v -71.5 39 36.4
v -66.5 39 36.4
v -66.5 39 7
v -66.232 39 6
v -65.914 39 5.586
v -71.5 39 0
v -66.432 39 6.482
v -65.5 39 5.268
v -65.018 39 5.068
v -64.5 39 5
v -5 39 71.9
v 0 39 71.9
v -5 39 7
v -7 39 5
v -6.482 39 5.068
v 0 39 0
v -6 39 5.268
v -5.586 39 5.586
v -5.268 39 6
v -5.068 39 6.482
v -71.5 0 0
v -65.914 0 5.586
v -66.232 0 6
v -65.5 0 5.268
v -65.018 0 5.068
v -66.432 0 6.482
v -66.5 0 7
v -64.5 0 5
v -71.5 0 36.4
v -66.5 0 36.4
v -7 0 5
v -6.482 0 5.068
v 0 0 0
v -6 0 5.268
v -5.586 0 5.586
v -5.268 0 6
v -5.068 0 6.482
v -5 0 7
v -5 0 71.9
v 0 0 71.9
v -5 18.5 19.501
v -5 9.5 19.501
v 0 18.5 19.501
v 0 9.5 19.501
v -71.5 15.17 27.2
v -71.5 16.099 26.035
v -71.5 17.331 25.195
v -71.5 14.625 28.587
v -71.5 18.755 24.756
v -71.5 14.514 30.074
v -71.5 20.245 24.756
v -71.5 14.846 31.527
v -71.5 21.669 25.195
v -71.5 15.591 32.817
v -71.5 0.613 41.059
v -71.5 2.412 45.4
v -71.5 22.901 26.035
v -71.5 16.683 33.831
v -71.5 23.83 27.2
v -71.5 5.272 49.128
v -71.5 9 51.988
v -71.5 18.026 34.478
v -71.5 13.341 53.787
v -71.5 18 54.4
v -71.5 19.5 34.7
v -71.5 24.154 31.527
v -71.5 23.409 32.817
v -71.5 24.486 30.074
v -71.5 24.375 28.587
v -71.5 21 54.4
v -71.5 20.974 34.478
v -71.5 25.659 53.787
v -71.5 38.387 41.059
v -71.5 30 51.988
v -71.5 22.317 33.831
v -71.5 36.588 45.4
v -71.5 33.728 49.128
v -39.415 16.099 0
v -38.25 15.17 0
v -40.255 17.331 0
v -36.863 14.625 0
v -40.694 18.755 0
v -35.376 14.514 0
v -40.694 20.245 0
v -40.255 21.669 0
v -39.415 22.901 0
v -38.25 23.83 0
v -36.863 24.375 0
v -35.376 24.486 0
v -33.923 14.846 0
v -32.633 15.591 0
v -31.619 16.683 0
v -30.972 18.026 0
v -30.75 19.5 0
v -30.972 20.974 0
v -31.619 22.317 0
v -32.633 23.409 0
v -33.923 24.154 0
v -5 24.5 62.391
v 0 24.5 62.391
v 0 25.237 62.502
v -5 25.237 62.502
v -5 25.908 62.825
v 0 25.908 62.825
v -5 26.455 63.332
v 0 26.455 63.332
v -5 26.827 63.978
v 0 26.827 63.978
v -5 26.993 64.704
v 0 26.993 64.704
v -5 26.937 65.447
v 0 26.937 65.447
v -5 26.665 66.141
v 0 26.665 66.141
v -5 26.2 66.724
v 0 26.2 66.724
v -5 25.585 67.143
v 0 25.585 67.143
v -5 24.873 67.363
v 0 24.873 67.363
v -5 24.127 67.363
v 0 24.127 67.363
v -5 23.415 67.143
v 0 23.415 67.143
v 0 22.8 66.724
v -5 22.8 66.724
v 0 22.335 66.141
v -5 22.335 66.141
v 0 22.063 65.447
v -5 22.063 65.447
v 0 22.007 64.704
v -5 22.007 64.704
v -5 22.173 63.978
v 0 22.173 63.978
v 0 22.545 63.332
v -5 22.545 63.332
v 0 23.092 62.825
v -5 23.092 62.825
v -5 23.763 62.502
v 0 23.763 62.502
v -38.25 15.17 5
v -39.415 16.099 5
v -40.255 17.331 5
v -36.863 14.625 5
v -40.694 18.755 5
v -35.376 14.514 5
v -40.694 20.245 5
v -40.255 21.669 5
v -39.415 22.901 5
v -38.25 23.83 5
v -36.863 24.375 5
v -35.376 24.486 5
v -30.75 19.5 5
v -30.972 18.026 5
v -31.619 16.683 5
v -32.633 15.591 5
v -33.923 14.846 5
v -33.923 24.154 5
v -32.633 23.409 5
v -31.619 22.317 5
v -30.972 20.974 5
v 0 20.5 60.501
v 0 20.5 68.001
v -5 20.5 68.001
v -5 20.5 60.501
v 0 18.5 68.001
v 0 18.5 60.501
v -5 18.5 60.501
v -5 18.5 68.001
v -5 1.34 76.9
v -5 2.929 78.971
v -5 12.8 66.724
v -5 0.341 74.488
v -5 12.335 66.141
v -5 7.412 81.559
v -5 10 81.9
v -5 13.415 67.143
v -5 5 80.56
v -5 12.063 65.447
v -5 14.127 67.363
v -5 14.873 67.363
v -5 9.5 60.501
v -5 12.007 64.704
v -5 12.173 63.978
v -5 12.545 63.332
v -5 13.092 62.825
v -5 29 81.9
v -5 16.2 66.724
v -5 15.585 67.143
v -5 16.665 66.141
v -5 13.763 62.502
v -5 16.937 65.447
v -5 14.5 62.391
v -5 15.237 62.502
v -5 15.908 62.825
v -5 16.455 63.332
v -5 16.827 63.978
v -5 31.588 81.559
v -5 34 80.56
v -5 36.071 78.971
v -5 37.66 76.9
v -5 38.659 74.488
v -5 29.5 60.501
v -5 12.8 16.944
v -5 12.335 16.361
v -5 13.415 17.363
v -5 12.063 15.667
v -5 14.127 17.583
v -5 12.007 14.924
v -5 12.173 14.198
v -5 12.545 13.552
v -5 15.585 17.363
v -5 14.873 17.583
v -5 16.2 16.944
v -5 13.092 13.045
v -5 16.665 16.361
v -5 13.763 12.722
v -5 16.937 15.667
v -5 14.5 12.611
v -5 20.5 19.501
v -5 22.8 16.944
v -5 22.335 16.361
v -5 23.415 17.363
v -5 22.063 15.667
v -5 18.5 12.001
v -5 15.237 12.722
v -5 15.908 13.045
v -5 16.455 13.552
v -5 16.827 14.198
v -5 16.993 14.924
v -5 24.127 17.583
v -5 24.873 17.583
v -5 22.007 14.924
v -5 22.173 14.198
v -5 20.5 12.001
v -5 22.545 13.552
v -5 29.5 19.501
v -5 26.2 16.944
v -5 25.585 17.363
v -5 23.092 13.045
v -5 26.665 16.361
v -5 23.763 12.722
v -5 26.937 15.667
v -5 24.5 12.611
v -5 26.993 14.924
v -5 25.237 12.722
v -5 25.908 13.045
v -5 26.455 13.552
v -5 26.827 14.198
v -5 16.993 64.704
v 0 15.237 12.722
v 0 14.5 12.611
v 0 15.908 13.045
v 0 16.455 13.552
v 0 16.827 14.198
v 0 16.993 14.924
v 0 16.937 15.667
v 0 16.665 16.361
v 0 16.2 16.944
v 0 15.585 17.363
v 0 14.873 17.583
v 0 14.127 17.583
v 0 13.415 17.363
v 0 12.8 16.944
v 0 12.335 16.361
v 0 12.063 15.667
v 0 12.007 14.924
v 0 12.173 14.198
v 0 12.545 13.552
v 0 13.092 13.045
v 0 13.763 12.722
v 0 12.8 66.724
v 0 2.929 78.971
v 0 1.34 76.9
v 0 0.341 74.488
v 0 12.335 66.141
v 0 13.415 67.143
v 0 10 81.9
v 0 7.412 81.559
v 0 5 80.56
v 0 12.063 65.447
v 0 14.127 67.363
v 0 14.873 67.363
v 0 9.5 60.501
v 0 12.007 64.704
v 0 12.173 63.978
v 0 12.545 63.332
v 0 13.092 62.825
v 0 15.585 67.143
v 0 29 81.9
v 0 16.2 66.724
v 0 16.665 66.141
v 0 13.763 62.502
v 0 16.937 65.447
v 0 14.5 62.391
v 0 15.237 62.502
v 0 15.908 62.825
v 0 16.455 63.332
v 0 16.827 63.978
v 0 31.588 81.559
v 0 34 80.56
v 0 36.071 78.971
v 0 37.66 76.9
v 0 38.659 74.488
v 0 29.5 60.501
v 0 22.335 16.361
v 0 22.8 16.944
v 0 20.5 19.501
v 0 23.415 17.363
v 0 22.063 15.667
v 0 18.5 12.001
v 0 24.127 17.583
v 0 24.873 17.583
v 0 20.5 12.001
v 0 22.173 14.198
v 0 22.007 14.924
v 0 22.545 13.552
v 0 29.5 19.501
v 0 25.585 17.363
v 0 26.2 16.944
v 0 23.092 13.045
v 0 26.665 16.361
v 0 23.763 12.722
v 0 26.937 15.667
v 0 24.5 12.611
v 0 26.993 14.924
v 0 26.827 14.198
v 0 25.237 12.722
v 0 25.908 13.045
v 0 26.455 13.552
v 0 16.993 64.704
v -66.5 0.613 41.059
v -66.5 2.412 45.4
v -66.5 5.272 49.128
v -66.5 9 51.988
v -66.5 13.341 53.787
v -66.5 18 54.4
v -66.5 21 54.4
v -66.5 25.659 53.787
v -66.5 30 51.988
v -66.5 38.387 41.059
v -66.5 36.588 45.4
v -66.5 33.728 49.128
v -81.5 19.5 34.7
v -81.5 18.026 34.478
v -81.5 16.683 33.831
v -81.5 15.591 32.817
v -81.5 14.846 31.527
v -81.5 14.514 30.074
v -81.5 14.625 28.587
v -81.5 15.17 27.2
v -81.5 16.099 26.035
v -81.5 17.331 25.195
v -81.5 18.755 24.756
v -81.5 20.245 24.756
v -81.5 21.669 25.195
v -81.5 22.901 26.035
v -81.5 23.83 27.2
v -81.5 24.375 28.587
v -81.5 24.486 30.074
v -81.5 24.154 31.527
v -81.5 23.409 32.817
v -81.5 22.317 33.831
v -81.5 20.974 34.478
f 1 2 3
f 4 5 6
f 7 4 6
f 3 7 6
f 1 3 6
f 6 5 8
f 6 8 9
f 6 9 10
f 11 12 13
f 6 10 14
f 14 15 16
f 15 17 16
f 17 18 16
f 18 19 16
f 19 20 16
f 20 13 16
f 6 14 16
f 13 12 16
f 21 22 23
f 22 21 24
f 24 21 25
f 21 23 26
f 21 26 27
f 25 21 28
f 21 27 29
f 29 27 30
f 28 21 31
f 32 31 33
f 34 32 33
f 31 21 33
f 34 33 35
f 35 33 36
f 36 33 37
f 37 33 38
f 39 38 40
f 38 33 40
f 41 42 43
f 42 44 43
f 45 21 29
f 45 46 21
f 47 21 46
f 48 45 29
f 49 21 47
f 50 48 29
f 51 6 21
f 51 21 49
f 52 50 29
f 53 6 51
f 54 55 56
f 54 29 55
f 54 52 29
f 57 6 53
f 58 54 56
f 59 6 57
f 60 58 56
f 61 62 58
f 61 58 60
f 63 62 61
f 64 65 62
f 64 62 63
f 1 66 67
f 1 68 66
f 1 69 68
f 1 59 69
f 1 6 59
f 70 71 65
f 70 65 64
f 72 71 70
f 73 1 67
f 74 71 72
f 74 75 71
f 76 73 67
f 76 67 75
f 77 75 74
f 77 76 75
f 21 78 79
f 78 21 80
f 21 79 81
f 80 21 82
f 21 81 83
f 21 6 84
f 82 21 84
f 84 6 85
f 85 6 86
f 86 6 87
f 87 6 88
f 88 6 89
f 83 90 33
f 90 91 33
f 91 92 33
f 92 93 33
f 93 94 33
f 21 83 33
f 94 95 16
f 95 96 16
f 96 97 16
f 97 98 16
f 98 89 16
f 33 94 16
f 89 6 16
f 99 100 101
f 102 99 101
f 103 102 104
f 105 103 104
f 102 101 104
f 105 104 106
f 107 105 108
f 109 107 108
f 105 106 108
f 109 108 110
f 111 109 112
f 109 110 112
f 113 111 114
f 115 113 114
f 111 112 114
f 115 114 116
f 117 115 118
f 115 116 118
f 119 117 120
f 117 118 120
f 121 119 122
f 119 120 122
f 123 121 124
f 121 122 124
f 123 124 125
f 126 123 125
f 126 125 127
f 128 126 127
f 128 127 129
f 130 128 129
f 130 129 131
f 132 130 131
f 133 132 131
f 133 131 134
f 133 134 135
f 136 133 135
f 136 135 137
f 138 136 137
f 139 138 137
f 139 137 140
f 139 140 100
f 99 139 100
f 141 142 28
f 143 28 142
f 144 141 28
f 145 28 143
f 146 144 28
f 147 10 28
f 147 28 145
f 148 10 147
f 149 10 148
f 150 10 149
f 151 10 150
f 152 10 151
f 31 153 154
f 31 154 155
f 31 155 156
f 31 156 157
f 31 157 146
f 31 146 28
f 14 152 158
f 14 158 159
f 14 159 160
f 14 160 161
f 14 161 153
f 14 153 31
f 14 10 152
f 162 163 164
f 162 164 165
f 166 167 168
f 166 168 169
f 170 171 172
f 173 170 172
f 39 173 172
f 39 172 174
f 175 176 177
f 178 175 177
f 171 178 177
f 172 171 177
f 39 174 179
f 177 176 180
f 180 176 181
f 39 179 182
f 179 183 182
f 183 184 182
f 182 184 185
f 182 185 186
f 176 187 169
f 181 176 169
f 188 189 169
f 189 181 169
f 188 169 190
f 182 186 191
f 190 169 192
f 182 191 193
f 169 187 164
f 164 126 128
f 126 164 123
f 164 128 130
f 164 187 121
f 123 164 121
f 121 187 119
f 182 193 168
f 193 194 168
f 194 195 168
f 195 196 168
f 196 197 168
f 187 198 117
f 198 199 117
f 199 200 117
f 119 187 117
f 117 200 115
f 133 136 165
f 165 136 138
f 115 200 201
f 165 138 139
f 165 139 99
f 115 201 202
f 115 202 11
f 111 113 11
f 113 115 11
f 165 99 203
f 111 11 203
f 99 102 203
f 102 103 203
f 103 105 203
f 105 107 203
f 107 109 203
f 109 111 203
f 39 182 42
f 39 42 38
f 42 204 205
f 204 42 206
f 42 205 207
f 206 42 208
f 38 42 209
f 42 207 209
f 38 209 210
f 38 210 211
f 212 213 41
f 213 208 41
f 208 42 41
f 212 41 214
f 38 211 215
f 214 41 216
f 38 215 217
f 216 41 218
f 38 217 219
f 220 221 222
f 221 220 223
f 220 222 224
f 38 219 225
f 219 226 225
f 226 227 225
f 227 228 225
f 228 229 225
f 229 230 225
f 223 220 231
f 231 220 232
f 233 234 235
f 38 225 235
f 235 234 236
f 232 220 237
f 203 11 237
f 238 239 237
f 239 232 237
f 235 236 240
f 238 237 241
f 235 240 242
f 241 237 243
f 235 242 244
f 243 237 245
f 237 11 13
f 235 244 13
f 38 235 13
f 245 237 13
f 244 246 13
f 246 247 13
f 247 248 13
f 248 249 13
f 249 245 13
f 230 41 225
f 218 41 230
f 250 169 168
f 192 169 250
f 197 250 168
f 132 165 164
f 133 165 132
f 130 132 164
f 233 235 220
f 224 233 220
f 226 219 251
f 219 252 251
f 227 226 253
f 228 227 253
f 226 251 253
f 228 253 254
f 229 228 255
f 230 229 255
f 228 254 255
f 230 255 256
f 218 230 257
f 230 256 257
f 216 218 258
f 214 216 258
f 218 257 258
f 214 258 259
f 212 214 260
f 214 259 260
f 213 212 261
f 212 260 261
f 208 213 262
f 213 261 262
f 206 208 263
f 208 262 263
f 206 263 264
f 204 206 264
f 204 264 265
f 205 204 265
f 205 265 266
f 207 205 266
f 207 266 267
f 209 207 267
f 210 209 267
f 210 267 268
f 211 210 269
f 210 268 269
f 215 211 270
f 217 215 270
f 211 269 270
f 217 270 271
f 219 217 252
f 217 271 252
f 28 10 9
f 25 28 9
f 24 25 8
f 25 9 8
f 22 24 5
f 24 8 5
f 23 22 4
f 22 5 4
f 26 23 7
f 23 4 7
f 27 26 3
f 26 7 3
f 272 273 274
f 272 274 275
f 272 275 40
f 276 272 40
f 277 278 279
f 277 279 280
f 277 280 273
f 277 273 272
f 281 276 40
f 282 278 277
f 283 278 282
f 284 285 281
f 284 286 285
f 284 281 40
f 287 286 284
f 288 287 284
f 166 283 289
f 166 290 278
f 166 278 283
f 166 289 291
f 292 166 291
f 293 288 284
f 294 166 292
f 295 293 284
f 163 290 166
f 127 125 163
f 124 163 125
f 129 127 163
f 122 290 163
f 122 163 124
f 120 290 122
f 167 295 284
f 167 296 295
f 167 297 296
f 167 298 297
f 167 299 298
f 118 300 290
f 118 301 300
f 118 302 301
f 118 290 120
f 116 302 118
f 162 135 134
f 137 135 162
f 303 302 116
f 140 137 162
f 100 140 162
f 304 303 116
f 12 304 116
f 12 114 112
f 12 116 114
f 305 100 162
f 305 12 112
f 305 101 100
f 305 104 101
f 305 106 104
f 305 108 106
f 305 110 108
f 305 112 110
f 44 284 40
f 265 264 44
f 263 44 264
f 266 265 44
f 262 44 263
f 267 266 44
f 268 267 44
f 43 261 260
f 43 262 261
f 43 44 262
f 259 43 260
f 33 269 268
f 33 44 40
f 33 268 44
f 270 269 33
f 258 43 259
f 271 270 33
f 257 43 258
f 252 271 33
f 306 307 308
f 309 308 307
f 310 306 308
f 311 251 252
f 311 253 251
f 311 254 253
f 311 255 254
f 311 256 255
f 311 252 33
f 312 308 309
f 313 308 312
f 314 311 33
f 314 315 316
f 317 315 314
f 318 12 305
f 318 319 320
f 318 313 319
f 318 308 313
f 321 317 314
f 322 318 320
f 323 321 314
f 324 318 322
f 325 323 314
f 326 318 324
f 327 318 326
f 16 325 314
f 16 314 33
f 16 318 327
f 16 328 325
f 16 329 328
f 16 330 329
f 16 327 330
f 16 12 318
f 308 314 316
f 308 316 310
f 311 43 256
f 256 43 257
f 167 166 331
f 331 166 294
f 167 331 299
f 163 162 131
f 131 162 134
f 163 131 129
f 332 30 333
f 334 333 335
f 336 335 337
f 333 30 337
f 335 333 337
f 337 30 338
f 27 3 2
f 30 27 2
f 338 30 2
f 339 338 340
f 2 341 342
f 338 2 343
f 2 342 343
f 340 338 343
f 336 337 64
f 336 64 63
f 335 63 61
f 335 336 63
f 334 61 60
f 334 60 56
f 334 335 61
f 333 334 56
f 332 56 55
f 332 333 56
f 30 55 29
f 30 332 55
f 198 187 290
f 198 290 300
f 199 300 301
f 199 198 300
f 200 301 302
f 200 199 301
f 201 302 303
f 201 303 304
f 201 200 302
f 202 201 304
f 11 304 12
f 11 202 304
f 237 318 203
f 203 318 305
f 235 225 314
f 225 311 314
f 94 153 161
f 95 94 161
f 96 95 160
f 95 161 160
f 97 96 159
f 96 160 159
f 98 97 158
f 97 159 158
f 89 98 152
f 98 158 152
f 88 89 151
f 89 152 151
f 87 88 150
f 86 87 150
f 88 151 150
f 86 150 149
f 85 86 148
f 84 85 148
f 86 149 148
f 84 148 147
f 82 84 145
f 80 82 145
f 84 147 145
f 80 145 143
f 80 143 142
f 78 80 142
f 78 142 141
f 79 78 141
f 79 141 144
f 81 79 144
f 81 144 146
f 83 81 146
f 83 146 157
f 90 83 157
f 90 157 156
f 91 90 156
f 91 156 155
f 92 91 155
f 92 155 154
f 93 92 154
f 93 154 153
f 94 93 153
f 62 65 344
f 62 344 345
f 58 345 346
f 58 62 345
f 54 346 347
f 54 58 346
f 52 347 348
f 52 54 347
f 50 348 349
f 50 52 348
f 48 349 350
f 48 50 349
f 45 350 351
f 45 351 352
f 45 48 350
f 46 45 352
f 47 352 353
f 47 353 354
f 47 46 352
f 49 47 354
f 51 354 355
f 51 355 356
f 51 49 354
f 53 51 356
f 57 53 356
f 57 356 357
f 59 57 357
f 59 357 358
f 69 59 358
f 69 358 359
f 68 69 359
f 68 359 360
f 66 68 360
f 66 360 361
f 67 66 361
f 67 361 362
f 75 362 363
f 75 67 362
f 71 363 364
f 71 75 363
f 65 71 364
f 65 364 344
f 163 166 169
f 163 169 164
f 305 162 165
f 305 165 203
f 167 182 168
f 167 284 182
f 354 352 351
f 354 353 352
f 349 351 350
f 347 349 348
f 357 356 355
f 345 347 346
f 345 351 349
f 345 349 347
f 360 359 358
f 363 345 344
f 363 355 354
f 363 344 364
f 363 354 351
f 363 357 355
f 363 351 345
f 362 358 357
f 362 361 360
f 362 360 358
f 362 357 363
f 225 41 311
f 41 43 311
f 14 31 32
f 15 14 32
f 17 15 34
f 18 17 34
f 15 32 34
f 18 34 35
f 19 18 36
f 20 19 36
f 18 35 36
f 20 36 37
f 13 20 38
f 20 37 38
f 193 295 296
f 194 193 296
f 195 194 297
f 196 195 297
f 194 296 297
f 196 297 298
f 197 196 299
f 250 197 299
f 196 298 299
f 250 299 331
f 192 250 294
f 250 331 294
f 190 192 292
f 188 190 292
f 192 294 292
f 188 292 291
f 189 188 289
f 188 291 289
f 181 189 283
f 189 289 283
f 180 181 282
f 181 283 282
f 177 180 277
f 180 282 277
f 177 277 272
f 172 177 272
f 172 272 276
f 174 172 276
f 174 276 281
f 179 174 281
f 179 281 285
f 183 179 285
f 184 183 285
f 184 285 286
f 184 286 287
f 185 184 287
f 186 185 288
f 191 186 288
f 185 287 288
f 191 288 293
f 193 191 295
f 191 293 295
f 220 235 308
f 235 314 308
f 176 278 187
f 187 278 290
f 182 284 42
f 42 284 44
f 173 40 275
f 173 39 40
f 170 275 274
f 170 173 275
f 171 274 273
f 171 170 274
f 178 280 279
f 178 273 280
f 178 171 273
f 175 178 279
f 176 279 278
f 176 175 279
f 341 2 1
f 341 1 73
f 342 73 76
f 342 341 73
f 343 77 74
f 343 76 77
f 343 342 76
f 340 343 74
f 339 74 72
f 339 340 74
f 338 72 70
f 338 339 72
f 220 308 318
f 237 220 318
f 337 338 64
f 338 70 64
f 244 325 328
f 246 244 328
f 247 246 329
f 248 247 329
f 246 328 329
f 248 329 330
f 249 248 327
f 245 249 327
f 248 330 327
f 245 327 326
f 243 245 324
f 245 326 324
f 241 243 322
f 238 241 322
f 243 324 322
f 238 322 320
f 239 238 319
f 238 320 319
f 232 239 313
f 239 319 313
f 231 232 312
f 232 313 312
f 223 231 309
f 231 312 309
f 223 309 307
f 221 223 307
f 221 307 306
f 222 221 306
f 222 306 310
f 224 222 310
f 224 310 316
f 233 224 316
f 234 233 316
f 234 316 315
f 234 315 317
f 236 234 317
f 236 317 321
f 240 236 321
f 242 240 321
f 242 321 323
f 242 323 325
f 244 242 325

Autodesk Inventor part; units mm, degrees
ref_plane "YZ Plane" through (0, 0, 0) normal (1, 0, 0) x (0, 1, 0)
ref_plane "XZ Plane" through (0, 0, 0) normal (0, 1, 0) x (-1, 0, 0)
ref_plane "XY Plane" through (0, 0, 0) normal (0, 0, 1) x (1, 0, 0)
sketch "Esquisse1" plane through (0, 0, 0) normal (0, 0, 1) x (1, 0, 0)
  line L0 (0, 0) -> (-71.5, 0)
  line L1 (-71.5, 0) -> (-71.5, 39)
  line L2 (-71.5, 39) -> (0, 39)
  line L3 (0, 39) -> (0, 0)
  dimension "d0" = 71.5
  dimension "d1" = 39
extrude "Extrusion1" add sketch "Esquisse1" along normal blind 5
sketch "Esquisse2" plane through (0, 0, 5) normal (0, 0, 1) x (1, 0, 0)
  line L0 (0, 39) -> (-71.5, 39) projected
  line L1 (-71.5, 39) -> (0, 0)
  line L2 (0, 0) -> (0, 39) projected
  line L3 (-71.5, 0) -> (0, 39)
  circle A0 centre (-35.75, 19.5) radius 5
  dimension "d4" = 10
extrude "Extrusion2" cut sketch "Esquisse2" against normal blind 5 contours A0 L1 L3 | L3 L1 A0 | L1 L3 A0 | A0 L3 L1
sketch "Esquisse3" plane through (-71.5, 0, 0) normal (-1, 0, 0) x (0, 0, 1)
  line L0 (0, 39) -> (5, 39) projected
  line L1 (5, 39) -> (54.4, 39)
  line L2 (54.4, 39) -> (54.4, 0)
  line L3 (54.4, 0) -> (5, 0)
  line L4 (5, 0) -> (5, 39)
  point P0 (0, 0)
  dimension "d7" = 49.4
extrude "Extrusion3" add sketch "Esquisse3" against normal blind 5
fillet "Congé1" radius 18 1 edges at (-69, 0, 54.4)
fillet "Congé2" radius 18 1 edges at (-69, 39, 54.4)
sketch "Esquisse4" plane through (-71.5, 0, 0) normal (-1, 0, 0) x (0, 0, 1)
  line L0 (36.4, 0) -> (5, 0) projected
  line L1 (5, 0) -> (54.4, 39)
  line L2 (5, 39) -> (5, 0) projected
  line L3 (5, 39) -> (54.4, 0)
  circle A0 centre (29.7, 19.5) radius 5
  point P0 (0, 0)
  dimension "d12" = 10
extrude "Extrusion4" add sketch "Esquisse4" along normal blind 10 contours A0 L3 L1 | L1 L3 A0 | L3 A0 L1 | L1 A0 L3
sketch "Esquisse5" plane through (0, 0, 0) normal (1, 0, 0) x (0, 0, -1)
  line L0 (-5, 0) -> (-81.9, 0)
  line L1 (-81.9, 0) -> (-81.9, 39)
  line L2 (-81.9, 39) -> (-5, 39)
  line L3 (-5, 39) -> (-5, 0)
  point P0 (0, 0)
  point P1 (-36.4, 39)
  dimension "d15" = 76.9
  dimension "d16" = 39
extrude "Extrusion5" add sketch "Esquisse5" against normal blind 5
fillet "Congé3" radius 10 1 edges at (-2.5, 39, 81.9)
fillet "Congé4" radius 10 1 edges at (-2.5, 0, 81.9)
sketch "Esquisse6" plane through (0, 0, 0) normal (1, 0, 0) x (0, 0, -1)
  line L0 (-60.501, 9.5) -> (-19.501, 9.5)
  line L1 (-19.501, 29.5) -> (-60.501, 29.5)
  circle A0 centre (-15.111, 14.5) radius 2.5
  circle A1 centre (-15.111, 24.5) radius 2.5
  circle A2 centre (-64.891, 14.5) radius 2.5
  circle A3 centre (-64.891, 24.5) radius 2.5
  line L2 (-19.501, 18.5) -> (-12.001, 18.5)
  line L3 (-12.001, 18.5) -> (-12.001, 20.5)
  line L4 (-12.001, 20.5) -> (-19.501, 20.5)
  line L5 (-60.501, 18.5) -> (-68.001, 18.5)
  line L6 (-68.001, 18.5) -> (-68.001, 20.5)
  line L7 (-68.001, 20.5) -> (-60.501, 20.5)
  line L8 (-19.501, 9.5) -> (-19.501, 18.5)
  line L9 (-19.501, 20.5) -> (-19.501, 29.5)
  line L10 (-60.501, 9.5) -> (-60.501, 18.5)
  line L11 (-60.501, 20.5) -> (-60.501, 29.5)
  line L12 (0, 0) -> (-71.9, 0) projected
  line L13 (0, 39) -> (-71.9, 39) projected
  line L14 (0, 39) -> (0, 0) projected
  point P0 (-29.706, 19.5075)
  dimension "d21" = 41
  dimension "d22" = 20
  dimension "d23" = 5
  dimension "d24" = 5
  dimension "d25" = 5
  dimension "d26" = 5
  dimension "d27" = 10
  dimension "d29" = 5
  dimension "d30" = 10
  dimension "d31" = 5
  dimension "d33" = 9
  dimension "d34" = 9
  dimension "d35" = 9
  dimension "d36" = 9
  dimension "d37" = 7.5
  dimension "d38" = 7.5
  dimension "d40" = 9.5
  dimension "d41" = 9.5
  dimension "d42" = 4.39
  dimension "d43" = 4.39
  dimension "d44" = 10.205
  dimension "d49" = 29.706
  dimension "d50" = 41
  dimension "d51" = 4.39
  dimension "d52" = 4.39
extrude "Extrusion6" cut sketch "Esquisse6" against normal blind 5
fillet "Congé5" radius 2 1 edges at (-66.5, 19.5, 5)
fillet "Congé6" radius 2 1 edges at (-5, 19.5, 5)
properties part number "ShoulderPart1" material "Plastique ABS"
